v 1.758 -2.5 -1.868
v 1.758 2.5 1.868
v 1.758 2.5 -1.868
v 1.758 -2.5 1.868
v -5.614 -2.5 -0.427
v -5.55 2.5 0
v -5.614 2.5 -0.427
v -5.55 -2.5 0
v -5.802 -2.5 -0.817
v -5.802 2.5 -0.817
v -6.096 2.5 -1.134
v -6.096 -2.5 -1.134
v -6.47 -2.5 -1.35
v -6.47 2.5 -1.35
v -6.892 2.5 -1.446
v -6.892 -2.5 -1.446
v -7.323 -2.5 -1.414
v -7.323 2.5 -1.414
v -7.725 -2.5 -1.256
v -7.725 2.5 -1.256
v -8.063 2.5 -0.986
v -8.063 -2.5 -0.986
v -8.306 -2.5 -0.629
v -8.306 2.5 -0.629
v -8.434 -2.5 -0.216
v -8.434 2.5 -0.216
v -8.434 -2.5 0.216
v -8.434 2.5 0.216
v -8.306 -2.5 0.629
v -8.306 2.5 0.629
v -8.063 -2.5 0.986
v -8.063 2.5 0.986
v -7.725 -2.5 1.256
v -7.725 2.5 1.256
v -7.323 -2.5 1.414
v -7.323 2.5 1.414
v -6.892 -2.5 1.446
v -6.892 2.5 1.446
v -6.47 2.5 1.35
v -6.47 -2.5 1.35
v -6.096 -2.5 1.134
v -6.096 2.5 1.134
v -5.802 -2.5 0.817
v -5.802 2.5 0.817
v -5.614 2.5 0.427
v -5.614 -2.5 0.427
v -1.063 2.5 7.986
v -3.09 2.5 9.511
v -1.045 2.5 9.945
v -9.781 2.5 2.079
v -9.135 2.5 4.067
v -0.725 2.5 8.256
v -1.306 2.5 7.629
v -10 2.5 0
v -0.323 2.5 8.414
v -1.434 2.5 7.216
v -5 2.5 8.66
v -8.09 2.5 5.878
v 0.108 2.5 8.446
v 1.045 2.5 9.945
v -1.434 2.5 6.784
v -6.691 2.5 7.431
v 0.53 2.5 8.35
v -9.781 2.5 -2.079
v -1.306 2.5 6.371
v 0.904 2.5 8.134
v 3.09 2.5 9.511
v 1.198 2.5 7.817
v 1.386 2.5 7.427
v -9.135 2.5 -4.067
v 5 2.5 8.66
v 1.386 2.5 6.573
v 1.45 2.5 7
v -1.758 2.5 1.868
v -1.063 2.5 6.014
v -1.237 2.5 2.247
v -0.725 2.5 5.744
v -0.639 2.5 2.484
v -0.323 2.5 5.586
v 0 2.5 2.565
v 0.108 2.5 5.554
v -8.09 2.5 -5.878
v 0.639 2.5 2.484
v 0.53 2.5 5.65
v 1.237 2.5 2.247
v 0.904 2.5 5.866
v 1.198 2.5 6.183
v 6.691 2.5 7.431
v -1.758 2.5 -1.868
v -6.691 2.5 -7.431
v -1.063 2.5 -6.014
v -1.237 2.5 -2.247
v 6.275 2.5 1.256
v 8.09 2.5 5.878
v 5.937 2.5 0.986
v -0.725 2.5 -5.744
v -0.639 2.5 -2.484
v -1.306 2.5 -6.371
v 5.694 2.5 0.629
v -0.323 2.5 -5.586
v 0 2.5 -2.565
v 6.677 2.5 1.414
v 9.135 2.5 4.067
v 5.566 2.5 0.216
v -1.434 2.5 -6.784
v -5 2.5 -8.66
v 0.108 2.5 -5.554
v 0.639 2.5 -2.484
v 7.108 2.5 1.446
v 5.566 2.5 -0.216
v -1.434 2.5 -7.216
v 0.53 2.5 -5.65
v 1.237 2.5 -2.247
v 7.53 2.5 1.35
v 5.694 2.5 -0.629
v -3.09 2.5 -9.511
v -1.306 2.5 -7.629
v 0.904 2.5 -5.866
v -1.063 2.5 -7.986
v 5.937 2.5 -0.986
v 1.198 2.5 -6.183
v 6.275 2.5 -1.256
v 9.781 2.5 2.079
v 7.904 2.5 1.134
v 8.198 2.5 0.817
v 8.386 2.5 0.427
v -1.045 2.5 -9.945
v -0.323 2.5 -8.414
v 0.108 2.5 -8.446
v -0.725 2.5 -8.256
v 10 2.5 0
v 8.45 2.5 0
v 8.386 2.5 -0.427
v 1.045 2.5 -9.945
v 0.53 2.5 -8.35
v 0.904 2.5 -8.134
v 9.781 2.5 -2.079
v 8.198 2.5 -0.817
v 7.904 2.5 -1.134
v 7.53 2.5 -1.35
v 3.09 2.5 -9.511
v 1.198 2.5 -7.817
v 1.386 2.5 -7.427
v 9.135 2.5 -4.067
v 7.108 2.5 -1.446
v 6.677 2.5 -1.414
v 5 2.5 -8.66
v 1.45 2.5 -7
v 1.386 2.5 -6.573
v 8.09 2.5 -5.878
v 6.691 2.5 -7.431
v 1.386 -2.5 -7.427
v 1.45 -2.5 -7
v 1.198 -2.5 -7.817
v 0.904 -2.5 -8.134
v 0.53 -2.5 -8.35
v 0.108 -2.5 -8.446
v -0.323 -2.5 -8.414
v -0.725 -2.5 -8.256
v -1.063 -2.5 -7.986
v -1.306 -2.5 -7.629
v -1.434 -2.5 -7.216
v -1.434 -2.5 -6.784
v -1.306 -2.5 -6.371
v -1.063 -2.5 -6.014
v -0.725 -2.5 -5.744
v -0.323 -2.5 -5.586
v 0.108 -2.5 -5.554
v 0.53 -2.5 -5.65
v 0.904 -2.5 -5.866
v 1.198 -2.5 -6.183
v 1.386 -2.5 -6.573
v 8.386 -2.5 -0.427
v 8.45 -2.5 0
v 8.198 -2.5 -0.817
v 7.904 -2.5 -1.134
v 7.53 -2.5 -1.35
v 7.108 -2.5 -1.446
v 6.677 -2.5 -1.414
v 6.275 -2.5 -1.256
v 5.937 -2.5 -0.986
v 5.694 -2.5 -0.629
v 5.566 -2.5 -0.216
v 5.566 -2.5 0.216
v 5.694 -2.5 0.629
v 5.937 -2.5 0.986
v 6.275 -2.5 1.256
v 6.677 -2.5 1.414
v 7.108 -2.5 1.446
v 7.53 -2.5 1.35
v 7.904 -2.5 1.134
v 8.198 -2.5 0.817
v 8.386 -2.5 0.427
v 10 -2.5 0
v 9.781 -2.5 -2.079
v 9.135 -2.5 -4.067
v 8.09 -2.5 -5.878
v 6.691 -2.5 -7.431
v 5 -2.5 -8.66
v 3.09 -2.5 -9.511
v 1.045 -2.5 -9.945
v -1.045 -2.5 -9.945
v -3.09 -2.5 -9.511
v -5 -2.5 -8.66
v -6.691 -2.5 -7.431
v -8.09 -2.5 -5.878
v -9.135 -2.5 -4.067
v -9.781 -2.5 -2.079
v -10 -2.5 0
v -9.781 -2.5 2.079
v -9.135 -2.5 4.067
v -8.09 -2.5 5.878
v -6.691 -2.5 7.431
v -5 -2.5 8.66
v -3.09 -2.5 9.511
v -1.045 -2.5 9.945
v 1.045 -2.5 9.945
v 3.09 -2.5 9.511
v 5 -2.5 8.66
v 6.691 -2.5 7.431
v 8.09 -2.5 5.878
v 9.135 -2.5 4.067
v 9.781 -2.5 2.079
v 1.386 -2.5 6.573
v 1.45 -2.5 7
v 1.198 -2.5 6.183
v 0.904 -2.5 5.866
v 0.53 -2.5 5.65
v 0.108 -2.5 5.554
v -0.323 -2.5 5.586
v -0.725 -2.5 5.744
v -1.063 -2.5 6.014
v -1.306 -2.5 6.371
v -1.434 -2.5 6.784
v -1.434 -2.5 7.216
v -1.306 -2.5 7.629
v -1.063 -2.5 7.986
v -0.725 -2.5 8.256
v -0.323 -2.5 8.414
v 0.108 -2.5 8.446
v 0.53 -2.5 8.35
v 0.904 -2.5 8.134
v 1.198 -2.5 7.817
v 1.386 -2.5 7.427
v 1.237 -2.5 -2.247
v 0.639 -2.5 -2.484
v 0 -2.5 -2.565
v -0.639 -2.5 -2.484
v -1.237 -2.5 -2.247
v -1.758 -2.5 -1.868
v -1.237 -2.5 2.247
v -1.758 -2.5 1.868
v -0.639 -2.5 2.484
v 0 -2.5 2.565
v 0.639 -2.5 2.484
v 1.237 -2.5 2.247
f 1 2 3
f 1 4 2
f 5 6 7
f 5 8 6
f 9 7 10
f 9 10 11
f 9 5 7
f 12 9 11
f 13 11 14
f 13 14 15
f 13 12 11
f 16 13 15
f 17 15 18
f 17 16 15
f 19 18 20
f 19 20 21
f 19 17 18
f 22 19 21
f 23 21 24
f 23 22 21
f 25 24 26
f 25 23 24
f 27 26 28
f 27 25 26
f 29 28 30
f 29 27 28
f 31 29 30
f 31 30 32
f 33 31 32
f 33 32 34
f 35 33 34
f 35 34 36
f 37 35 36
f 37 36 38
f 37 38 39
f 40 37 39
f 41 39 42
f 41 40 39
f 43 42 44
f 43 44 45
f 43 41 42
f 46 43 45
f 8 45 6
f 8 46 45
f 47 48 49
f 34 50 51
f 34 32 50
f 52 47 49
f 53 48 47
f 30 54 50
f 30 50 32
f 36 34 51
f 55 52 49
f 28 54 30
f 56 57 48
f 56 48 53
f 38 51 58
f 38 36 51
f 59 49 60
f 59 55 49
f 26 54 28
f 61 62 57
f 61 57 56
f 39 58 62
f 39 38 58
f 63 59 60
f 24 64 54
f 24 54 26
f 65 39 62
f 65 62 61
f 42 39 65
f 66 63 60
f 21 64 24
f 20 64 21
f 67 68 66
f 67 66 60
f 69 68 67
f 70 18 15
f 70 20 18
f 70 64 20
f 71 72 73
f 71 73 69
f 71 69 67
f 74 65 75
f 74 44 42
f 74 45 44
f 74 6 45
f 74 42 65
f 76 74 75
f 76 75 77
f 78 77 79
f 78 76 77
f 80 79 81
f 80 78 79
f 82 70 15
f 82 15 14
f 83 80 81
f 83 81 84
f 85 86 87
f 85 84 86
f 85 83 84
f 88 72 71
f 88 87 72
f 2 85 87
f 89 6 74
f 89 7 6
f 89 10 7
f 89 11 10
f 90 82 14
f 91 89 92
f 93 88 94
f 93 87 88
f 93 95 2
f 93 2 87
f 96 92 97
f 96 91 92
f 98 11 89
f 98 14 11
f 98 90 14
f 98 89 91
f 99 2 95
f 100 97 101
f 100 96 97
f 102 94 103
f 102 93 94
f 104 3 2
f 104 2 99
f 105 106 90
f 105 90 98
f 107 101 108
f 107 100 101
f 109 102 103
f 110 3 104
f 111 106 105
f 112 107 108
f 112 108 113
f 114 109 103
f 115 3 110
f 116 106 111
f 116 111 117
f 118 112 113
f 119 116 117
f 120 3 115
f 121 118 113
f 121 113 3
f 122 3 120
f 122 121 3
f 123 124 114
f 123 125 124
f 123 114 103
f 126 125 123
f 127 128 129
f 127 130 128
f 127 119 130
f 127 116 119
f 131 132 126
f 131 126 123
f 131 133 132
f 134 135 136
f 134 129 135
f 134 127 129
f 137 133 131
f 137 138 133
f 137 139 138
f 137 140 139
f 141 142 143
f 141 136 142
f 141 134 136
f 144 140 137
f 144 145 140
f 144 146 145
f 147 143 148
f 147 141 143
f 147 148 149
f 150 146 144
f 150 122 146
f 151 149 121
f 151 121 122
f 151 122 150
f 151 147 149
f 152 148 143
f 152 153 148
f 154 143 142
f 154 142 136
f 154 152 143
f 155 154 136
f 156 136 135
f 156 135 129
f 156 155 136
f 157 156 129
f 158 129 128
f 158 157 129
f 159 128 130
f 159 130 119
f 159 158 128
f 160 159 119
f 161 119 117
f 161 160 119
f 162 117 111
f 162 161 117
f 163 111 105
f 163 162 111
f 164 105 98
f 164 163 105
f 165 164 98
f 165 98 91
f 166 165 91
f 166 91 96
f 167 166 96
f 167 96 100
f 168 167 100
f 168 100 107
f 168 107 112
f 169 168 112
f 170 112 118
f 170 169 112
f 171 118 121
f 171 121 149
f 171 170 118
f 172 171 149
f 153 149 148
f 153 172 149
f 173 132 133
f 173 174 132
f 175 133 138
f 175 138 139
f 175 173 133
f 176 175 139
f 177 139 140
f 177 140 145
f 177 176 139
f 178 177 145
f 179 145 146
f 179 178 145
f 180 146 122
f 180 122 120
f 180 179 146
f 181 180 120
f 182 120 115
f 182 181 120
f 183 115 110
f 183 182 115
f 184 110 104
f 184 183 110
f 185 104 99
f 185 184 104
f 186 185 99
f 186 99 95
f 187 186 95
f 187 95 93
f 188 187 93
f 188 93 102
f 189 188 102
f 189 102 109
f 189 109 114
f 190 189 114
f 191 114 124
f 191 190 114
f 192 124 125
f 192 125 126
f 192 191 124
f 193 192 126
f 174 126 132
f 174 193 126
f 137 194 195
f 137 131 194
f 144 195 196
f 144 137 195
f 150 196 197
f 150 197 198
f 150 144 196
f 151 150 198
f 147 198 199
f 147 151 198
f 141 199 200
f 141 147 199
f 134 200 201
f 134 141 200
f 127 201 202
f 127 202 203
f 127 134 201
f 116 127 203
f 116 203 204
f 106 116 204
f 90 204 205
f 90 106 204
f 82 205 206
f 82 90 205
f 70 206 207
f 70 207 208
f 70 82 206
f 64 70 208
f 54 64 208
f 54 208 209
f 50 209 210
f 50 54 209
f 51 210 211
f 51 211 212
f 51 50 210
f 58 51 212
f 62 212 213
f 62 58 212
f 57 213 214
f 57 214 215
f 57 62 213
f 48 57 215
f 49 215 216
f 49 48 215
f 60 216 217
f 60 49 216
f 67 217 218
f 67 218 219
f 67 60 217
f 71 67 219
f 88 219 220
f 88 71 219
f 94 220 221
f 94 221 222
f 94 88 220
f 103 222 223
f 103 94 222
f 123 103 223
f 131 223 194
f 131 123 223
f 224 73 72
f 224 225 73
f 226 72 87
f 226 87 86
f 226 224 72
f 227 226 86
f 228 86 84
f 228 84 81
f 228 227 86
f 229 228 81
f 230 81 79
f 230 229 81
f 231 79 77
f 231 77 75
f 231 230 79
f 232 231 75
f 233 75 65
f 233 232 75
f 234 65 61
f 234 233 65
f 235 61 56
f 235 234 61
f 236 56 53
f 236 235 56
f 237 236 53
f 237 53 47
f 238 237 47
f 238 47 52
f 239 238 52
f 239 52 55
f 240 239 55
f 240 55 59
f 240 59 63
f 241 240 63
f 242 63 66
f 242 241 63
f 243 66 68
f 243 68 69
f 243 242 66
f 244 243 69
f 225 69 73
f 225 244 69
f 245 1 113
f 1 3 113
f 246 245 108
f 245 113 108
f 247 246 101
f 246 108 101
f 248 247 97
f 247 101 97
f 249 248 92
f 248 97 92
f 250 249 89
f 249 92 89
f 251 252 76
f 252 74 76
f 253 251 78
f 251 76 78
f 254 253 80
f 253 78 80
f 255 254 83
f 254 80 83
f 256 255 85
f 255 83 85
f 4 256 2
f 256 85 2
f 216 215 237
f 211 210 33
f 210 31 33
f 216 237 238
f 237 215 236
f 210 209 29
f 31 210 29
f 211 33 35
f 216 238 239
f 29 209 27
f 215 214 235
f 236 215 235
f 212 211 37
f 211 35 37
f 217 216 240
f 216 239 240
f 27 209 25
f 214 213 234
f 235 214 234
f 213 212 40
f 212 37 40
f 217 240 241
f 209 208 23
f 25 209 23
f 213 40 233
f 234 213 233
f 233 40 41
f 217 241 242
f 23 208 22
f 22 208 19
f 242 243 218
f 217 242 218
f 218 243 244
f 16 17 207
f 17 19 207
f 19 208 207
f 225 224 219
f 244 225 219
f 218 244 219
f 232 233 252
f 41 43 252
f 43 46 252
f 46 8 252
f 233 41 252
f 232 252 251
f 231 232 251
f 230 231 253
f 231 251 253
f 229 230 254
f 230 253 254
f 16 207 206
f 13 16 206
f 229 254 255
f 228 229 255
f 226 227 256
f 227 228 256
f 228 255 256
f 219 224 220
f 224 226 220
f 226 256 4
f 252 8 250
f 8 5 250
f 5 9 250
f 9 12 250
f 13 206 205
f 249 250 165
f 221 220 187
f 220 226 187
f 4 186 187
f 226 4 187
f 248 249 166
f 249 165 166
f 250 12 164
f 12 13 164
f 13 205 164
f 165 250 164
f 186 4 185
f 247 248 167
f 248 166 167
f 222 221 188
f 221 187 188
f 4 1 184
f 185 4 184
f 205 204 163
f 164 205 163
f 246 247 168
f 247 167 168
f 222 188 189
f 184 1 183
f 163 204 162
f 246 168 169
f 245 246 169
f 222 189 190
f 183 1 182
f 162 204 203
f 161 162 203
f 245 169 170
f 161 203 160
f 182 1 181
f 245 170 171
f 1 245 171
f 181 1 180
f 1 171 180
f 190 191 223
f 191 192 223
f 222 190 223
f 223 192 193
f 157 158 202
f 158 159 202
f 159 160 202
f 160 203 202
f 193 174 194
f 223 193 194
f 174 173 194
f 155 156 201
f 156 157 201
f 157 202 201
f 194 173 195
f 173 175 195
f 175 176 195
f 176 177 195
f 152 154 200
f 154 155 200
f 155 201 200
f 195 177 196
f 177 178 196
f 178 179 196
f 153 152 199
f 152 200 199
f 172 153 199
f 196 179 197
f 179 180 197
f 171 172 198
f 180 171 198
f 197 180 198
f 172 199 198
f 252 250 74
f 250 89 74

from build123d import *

# Parameters (mm, degrees)
SKETCH_1_R      = 10
SKETCH_1_R_2    = 1.45
EXTRUDE_1_DEPTH = 2.5


with BuildPart() as part:
    # 草图1 → 凸台-拉伸1 (new body, symmetric)
    with BuildSketch(Plane(origin=(0, 0, 0), x_dir=(1, 0, 0), z_dir=(0, 1, 0))):
        Circle(SKETCH_1_R)
        with Locations((7, 0)):
            Circle(SKETCH_1_R_2, mode=Mode.SUBTRACT)
        with Locations((0, 7)):
            Circle(SKETCH_1_R_2, mode=Mode.SUBTRACT)
        with Locations((-7, 0)):
            Circle(SKETCH_1_R_2, mode=Mode.SUBTRACT)
        with Locations((0, -7)):
            Circle(SKETCH_1_R_2, mode=Mode.SUBTRACT)
        with BuildLine():
            Line((1.7575, 0), (1.7575, 1.868266242))
            ThreePointArc((1.7575, 1.868266242), (0, 2.565), (-1.7575, 1.868266242))
            Line((-1.7575, 1.868266242), (-1.7575, 0))
            Line((-1.7575, 0), (-1.7575, -1.868266242))
            ThreePointArc((-1.7575, -1.868266242), (0, -2.565), (1.7575, -1.868266242))
            Line((1.7575, -1.868266242), (1.7575, 0))
        make_face(mode=Mode.SUBTRACT)
    extrude(amount=EXTRUDE_1_DEPTH, both=True)


solid = part.part
